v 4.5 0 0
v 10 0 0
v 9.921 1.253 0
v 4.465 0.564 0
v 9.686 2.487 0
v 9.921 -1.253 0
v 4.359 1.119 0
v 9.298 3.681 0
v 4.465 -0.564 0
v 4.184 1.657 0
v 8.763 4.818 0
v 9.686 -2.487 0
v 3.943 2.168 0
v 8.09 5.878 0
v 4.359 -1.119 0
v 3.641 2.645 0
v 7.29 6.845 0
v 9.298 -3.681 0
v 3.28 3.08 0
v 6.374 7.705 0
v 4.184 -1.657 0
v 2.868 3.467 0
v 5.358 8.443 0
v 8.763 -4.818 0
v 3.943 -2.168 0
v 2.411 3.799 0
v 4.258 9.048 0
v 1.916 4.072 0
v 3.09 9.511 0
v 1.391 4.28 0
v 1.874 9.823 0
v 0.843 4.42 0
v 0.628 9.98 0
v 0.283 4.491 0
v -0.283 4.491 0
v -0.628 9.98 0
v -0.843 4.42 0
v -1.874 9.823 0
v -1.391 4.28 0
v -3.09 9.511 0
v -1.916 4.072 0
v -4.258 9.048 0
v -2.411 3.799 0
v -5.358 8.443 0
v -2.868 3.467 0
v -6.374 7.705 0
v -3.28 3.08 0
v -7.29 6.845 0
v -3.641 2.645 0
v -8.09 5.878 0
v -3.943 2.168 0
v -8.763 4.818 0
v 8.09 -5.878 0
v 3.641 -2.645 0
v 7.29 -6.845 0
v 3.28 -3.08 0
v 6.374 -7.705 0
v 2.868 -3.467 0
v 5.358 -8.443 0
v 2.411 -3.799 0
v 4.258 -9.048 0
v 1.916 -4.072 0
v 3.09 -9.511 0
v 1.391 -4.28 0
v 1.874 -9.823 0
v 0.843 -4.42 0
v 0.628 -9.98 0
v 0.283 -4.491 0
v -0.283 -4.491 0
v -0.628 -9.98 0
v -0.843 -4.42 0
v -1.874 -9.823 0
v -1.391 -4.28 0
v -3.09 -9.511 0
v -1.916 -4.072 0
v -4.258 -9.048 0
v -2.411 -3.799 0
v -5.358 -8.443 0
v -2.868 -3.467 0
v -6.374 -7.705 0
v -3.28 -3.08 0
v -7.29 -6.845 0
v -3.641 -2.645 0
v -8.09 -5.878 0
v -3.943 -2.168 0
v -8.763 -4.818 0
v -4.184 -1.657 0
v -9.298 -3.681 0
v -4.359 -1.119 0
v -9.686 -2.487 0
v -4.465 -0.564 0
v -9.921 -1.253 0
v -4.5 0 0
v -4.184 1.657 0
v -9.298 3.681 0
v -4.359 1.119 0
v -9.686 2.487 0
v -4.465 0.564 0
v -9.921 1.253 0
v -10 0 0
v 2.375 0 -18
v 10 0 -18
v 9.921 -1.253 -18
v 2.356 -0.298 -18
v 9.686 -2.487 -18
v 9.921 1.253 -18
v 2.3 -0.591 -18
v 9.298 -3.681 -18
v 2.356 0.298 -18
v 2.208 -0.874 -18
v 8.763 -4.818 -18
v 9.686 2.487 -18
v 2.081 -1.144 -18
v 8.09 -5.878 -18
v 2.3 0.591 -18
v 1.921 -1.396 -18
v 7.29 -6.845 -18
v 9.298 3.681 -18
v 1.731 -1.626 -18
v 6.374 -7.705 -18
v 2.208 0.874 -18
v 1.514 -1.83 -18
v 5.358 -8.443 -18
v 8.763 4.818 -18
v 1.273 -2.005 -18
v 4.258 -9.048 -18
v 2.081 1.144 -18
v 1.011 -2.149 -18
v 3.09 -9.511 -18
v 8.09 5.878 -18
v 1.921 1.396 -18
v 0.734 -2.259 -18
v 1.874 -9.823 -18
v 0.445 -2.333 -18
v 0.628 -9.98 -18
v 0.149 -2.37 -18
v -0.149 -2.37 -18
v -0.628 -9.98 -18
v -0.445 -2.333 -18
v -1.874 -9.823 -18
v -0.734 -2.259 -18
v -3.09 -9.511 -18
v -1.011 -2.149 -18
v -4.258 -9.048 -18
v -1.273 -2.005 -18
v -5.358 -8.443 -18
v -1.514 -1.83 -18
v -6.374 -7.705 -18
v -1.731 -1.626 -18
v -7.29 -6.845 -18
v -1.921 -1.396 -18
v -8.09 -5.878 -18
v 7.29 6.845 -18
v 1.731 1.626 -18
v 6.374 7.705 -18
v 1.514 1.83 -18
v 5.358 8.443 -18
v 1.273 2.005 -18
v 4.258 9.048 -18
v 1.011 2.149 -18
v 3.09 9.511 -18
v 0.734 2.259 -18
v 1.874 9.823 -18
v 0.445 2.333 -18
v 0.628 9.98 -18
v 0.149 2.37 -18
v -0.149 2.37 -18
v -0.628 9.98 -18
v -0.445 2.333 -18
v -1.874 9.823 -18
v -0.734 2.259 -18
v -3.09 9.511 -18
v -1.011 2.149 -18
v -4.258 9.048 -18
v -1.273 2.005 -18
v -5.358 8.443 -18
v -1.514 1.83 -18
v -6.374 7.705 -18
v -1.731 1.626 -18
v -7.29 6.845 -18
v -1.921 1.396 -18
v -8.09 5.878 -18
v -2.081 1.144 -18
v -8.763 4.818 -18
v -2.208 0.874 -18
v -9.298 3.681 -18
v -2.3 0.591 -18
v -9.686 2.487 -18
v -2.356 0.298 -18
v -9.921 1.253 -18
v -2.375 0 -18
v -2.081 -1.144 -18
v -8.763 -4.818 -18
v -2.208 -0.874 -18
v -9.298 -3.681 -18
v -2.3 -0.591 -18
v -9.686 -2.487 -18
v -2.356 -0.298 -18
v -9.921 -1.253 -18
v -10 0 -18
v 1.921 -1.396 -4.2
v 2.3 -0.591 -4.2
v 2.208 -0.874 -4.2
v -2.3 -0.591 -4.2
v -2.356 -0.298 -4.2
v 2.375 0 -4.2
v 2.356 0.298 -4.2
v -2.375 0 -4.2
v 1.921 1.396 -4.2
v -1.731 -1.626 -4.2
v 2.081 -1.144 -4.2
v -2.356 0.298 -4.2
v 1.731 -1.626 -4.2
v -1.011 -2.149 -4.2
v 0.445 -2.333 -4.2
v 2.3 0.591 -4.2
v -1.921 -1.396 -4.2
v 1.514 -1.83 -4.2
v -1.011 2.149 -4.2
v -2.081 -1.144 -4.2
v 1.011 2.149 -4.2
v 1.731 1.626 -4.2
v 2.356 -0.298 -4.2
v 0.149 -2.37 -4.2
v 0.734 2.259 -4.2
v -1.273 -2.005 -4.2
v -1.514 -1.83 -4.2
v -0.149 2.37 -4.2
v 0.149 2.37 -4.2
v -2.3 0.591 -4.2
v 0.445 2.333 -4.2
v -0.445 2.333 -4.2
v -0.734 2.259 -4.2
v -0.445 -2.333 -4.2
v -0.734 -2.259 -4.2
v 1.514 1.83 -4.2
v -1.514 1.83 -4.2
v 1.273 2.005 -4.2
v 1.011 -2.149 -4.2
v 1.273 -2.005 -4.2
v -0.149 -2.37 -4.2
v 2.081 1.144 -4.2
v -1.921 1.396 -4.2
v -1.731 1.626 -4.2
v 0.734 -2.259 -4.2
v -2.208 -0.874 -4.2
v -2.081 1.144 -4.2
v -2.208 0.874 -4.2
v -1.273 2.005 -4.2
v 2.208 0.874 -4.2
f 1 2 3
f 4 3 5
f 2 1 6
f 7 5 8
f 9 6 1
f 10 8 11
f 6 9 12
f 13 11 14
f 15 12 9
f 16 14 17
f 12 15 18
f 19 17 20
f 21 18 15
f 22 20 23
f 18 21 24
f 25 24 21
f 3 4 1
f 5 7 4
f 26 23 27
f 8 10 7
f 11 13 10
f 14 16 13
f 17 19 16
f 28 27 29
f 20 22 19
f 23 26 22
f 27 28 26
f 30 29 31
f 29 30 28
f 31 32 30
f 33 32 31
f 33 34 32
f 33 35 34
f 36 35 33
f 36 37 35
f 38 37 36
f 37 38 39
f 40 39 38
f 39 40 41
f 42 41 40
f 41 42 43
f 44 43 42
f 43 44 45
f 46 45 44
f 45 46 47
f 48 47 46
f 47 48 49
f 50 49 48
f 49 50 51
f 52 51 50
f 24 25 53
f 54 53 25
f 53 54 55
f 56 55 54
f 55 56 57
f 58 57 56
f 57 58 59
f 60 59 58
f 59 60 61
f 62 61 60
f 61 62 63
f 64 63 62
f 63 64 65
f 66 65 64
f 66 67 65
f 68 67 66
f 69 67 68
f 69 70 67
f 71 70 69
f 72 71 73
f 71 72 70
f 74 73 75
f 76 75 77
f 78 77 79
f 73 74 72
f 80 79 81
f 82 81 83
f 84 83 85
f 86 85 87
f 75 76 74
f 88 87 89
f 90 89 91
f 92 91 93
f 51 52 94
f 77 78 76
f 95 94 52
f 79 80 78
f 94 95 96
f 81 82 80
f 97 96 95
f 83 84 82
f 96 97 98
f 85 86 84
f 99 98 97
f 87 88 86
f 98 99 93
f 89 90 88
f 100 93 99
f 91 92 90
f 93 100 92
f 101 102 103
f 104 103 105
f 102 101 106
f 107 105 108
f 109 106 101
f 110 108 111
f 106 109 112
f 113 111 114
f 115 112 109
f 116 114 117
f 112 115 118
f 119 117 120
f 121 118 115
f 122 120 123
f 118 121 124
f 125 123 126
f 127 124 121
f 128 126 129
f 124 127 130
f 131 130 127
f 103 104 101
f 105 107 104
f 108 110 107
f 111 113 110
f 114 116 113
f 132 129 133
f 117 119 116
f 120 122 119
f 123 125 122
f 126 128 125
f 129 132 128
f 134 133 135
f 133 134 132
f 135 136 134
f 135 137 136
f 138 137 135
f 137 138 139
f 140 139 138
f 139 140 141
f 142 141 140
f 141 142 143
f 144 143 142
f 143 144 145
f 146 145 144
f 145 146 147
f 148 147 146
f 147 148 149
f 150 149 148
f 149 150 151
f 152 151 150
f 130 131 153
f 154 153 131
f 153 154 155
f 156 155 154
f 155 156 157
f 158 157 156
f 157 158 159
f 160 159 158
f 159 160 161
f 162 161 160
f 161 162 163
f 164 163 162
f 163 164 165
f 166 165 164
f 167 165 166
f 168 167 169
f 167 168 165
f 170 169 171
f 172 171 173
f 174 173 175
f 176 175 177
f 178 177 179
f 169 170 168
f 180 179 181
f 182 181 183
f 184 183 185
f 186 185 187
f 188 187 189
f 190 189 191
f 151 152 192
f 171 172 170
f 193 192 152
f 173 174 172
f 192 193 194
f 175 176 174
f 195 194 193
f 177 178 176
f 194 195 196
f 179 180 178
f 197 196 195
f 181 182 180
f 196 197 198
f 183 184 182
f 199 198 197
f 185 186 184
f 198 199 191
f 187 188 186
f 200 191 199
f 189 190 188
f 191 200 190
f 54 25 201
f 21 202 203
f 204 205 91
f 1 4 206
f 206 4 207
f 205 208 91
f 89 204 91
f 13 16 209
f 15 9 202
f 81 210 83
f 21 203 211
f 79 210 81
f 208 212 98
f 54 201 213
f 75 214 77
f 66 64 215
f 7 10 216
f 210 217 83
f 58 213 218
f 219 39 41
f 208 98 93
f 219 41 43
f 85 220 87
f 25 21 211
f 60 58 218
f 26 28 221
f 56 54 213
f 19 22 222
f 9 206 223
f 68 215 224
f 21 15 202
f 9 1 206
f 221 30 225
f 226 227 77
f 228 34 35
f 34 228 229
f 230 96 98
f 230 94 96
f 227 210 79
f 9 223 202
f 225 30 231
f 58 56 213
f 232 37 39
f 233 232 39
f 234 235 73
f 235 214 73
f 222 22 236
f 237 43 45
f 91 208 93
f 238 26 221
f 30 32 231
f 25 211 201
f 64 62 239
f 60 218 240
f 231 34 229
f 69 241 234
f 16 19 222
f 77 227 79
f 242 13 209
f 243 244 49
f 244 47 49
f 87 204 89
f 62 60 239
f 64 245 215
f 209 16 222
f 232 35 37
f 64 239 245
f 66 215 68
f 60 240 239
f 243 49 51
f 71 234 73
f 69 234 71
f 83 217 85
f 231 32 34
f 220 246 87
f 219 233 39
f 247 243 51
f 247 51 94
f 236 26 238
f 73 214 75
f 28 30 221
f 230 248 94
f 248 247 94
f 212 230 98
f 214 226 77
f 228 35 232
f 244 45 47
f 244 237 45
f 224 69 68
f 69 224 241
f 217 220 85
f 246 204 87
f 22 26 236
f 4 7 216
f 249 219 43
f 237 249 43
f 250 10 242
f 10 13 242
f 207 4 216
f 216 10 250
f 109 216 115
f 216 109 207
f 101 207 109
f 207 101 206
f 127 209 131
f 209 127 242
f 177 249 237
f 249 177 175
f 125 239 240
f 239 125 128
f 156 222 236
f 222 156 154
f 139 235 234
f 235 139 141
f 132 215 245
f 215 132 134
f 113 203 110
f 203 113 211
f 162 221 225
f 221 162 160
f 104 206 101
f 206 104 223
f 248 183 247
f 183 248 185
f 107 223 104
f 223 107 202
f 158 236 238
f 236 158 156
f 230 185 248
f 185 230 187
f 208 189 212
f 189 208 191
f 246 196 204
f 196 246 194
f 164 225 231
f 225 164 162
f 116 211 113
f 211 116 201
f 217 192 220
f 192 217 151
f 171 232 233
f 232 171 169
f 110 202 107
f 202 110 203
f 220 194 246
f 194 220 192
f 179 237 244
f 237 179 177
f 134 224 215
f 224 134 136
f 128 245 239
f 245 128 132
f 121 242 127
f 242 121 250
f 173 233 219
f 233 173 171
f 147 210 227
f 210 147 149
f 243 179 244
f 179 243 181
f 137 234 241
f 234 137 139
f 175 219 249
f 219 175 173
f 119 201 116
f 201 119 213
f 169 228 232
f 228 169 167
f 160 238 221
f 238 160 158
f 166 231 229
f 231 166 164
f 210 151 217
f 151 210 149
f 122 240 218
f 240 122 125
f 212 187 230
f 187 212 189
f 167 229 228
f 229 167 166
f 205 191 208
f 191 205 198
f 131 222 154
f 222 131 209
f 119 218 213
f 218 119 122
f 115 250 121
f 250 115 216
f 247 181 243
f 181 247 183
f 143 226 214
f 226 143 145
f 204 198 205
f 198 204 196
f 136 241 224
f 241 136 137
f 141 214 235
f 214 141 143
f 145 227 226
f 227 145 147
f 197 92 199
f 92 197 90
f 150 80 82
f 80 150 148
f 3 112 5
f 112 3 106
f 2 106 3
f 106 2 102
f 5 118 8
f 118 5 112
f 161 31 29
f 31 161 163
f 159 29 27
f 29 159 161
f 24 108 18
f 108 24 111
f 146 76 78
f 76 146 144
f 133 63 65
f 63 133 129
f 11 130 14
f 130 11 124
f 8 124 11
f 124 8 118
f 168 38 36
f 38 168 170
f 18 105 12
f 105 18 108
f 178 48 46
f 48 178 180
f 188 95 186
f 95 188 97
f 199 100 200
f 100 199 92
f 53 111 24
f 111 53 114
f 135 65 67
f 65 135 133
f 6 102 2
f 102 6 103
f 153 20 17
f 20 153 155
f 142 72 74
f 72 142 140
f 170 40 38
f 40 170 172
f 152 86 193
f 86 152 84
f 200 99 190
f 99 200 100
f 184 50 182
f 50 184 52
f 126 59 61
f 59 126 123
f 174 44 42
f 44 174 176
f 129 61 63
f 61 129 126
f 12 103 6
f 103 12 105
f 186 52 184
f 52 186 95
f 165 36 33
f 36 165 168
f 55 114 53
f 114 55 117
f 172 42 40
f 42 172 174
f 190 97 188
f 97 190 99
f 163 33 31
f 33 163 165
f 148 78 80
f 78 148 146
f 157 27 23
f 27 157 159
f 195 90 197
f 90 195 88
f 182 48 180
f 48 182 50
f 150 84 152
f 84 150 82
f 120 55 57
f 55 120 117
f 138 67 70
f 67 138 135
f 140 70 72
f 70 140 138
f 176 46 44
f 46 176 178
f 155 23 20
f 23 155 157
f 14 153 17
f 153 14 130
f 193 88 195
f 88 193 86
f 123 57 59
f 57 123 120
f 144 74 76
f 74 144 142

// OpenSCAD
$fn = 50;


difference() {
	union() {
		translate(v = [0, 0, -18.0000000000]) {
			cylinder(h = 18, r = 10.0000000000);
		}
		cylinder(h = 0, r = 19.0000000000);
	}
	union() {
		translate(v = [0, 0, 0]) {
			rotate(a = [0, 0, 0]) {
				difference() {
					union() {
						#translate(v = [0, 0, -18.0000000000]) {
							cylinder(h = 18, r = 2.2500000000);
						}
						#translate(v = [0, 0, -4.2000000000]) {
							cylinder(h = 4.2000000000, r1 = 2.3750000000, r2 = 4.5000000000);
						}
						#translate(v = [0, 0, -18.0000000000]) {
							cylinder(h = 18, r = 2.3750000000);
						}
						#translate(v = [0, 0, -18.0000000000]) {
							cylinder(h = 18, r = 2.2500000000);
						}
					}
					union();
				}
			}
		}
	}
}
